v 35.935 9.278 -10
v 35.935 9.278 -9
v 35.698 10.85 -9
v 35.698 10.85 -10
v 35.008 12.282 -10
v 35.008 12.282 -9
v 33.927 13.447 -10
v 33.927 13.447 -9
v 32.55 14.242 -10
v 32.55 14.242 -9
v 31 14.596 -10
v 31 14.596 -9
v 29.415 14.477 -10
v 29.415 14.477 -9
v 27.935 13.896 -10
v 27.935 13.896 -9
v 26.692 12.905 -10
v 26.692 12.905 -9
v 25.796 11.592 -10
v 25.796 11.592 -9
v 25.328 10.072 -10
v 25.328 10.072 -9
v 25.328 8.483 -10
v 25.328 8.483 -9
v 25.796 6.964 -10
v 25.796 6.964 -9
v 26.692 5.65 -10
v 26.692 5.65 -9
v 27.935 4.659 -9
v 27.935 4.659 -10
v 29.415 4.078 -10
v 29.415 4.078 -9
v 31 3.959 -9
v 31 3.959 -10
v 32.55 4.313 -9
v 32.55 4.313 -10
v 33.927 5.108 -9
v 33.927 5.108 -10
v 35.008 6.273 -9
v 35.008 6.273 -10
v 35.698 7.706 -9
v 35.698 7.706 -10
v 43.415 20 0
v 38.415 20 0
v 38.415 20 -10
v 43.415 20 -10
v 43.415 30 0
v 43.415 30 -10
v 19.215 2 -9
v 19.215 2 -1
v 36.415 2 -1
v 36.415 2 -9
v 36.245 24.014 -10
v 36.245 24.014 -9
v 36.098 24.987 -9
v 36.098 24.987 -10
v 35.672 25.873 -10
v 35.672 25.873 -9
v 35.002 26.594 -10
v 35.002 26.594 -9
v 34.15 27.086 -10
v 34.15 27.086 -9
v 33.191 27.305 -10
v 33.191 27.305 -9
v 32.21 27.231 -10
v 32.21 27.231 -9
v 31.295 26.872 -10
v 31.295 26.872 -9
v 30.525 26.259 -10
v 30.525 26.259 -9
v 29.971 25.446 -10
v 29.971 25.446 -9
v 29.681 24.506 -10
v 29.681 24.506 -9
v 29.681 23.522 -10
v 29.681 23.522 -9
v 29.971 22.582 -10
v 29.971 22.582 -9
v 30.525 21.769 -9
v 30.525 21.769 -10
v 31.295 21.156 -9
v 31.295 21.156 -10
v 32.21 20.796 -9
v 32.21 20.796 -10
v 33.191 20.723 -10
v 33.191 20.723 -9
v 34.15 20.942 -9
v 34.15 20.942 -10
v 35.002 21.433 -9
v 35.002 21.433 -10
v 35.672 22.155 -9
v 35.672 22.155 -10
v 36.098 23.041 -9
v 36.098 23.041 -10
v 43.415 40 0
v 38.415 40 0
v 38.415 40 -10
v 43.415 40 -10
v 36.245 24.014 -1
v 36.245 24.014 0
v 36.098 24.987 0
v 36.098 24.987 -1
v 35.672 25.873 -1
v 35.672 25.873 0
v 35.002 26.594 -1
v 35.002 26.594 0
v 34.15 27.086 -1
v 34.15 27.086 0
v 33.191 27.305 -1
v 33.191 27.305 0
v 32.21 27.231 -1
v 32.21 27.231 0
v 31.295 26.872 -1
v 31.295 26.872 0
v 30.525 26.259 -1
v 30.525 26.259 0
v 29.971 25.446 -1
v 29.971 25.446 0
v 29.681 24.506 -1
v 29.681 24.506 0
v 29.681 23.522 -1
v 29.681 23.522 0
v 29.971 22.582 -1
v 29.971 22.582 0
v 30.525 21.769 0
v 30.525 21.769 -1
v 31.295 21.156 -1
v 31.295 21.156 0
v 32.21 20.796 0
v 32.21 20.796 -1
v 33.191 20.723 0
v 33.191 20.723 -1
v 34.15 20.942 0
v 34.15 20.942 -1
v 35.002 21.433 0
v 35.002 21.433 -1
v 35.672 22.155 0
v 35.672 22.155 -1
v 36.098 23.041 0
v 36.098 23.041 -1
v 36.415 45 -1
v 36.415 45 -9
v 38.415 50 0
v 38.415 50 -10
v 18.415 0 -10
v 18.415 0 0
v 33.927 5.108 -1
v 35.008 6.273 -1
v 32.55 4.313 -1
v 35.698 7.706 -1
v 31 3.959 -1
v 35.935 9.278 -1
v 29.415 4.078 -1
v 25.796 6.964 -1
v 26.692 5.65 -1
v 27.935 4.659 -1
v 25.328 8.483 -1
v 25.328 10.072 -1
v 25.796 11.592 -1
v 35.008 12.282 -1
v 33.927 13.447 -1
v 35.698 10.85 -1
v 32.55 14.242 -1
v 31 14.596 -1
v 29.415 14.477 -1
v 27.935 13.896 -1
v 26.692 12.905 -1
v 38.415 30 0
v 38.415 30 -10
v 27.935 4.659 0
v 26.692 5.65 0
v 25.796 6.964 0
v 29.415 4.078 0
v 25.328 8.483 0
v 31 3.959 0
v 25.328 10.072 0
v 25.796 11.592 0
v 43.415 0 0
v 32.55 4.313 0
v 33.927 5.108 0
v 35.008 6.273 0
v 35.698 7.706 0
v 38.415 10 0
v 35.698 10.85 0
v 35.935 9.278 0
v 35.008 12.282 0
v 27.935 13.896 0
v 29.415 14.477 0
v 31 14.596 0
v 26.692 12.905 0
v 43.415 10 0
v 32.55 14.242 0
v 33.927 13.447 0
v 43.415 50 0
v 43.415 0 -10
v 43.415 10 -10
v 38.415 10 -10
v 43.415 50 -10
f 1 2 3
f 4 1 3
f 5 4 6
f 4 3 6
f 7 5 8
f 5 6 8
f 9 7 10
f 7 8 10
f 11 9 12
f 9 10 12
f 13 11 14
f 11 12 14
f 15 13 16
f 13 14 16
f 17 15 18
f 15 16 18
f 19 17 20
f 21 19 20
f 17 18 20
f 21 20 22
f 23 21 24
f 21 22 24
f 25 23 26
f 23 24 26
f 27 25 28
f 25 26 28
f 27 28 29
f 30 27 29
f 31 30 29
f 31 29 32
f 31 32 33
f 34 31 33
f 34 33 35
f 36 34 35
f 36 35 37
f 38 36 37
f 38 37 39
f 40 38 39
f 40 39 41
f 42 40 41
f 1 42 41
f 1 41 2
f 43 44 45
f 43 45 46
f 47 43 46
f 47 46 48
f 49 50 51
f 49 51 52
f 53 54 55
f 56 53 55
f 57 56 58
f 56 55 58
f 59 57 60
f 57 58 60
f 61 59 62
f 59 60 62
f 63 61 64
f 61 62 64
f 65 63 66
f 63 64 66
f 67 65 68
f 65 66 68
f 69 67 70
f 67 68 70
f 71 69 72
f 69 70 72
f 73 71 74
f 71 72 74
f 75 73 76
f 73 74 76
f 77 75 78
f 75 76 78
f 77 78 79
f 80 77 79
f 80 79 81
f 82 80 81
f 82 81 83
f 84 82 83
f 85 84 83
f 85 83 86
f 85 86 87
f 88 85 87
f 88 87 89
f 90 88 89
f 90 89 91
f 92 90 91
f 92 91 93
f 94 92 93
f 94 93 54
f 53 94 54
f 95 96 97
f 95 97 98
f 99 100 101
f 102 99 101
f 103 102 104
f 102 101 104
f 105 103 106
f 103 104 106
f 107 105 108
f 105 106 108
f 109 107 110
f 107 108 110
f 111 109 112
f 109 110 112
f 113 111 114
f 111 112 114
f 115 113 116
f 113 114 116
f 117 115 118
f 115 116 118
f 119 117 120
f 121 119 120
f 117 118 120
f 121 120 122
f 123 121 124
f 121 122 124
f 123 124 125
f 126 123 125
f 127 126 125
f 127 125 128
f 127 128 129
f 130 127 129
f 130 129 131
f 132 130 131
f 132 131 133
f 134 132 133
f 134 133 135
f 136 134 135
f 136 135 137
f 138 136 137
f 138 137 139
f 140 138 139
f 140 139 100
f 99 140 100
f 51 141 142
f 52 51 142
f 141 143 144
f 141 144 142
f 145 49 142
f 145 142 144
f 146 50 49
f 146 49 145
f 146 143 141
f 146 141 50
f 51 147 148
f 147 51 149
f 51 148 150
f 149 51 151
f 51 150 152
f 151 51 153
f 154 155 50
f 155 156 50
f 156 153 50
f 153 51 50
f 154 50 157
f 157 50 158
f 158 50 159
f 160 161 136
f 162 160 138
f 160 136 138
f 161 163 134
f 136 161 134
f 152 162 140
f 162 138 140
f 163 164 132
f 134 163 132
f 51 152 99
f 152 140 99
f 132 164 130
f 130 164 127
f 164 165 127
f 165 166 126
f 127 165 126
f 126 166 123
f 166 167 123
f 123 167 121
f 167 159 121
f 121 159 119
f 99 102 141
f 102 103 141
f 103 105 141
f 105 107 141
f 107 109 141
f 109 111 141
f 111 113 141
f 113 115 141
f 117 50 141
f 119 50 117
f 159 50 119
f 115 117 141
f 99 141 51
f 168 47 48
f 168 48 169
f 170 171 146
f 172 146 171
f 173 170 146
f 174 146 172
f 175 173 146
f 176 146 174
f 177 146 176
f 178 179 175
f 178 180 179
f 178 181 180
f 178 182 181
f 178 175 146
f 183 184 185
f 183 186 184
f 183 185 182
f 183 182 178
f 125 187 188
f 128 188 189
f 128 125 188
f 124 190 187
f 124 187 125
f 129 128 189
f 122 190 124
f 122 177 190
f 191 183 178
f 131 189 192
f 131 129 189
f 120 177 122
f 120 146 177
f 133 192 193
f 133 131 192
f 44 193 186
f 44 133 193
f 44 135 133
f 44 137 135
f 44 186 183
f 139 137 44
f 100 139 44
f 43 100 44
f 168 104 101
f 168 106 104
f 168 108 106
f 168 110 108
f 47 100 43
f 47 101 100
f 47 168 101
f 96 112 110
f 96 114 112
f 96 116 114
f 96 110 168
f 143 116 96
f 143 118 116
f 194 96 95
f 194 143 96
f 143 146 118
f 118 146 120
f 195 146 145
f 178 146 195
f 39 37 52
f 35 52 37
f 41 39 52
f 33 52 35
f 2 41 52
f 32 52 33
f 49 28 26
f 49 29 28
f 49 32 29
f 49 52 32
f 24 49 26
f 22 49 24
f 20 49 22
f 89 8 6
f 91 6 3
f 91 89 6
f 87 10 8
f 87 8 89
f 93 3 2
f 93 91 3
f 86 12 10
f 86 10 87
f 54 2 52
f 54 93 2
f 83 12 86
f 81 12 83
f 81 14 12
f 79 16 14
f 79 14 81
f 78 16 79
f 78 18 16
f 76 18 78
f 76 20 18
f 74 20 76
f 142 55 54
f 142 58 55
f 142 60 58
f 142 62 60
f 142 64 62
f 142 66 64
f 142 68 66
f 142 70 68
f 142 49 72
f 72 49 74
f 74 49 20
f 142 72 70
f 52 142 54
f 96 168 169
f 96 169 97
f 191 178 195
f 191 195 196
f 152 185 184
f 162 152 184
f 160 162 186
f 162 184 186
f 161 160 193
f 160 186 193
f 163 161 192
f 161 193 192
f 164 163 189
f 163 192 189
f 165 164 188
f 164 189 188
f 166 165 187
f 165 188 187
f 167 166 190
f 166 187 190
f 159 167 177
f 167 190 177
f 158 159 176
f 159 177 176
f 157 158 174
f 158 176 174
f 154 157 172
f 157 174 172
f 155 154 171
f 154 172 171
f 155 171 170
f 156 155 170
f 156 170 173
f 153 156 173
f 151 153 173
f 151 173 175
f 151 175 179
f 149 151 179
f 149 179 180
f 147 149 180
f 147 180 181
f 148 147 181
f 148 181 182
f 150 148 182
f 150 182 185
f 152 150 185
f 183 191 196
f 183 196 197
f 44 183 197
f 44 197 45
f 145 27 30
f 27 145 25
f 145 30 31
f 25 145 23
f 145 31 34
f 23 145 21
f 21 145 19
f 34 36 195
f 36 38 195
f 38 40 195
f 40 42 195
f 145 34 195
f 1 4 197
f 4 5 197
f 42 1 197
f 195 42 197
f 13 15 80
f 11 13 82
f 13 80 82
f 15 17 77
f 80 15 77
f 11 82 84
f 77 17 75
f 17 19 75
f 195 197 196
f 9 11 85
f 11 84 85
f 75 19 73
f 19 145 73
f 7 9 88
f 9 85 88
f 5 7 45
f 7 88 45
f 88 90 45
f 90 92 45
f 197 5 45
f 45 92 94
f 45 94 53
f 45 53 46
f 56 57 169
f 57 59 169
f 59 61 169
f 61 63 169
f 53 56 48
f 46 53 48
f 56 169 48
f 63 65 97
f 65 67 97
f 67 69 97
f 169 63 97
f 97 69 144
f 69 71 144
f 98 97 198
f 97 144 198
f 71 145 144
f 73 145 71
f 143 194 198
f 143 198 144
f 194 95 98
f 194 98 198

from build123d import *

# Parameters (mm, degrees)
EXTRUDE_1_DEPTH     = 10
CUT_EXTRUDE_START   = 19.214766
SKETCH_3_W          = 8
SKETCH_3_H          = 48
CUT_EXTRUDE_4_DEPTH = 17.2
SKETCH_4_R          = 5.333163539
SKETCH_4_R_2        = 3.300328709
CUT_EXTRUDE_6_DEPTH = 67.968962262


with BuildPart() as part:
    # 草图1 → 凸台-拉伸1 (new body)
    with BuildSketch(Plane.XY):
        Polygon((38.414765995, 50), (18.414765995, 0), (43.414765995, 0), (43.414765995, 10), (38.414765995, 10), (38.414765995, 20), (43.414765995, 20), (43.414765995, 30), (38.414765995, 30), (38.414765995, 40), (43.414765995, 40), (43.414765995, 50), align=None)
    extrude(amount=-EXTRUDE_1_DEPTH)

    # 草图3 → 切除-拉伸4 (cut)
    with BuildSketch(Plane(origin=(0, 0, 0), x_dir=(0, 0, -1), z_dir=(1, 0, 0)).offset(CUT_EXTRUDE_START)):
        with Locations((5, 26)):
            Rectangle(SKETCH_3_W, SKETCH_3_H)
    extrude(amount=CUT_EXTRUDE_4_DEPTH, mode=Mode.SUBTRACT)

    # 草图4 → 切除-拉伸6 (cut, through all)
    with BuildSketch(Plane.XY):
        with Locations((30.601447123, 9.277555354)):
            Circle(SKETCH_4_R)
        with Locations((32.944682438, 24.013712258)):
            Circle(SKETCH_4_R_2)
    extrude(amount=-CUT_EXTRUDE_6_DEPTH, mode=Mode.SUBTRACT)


solid = part.part
